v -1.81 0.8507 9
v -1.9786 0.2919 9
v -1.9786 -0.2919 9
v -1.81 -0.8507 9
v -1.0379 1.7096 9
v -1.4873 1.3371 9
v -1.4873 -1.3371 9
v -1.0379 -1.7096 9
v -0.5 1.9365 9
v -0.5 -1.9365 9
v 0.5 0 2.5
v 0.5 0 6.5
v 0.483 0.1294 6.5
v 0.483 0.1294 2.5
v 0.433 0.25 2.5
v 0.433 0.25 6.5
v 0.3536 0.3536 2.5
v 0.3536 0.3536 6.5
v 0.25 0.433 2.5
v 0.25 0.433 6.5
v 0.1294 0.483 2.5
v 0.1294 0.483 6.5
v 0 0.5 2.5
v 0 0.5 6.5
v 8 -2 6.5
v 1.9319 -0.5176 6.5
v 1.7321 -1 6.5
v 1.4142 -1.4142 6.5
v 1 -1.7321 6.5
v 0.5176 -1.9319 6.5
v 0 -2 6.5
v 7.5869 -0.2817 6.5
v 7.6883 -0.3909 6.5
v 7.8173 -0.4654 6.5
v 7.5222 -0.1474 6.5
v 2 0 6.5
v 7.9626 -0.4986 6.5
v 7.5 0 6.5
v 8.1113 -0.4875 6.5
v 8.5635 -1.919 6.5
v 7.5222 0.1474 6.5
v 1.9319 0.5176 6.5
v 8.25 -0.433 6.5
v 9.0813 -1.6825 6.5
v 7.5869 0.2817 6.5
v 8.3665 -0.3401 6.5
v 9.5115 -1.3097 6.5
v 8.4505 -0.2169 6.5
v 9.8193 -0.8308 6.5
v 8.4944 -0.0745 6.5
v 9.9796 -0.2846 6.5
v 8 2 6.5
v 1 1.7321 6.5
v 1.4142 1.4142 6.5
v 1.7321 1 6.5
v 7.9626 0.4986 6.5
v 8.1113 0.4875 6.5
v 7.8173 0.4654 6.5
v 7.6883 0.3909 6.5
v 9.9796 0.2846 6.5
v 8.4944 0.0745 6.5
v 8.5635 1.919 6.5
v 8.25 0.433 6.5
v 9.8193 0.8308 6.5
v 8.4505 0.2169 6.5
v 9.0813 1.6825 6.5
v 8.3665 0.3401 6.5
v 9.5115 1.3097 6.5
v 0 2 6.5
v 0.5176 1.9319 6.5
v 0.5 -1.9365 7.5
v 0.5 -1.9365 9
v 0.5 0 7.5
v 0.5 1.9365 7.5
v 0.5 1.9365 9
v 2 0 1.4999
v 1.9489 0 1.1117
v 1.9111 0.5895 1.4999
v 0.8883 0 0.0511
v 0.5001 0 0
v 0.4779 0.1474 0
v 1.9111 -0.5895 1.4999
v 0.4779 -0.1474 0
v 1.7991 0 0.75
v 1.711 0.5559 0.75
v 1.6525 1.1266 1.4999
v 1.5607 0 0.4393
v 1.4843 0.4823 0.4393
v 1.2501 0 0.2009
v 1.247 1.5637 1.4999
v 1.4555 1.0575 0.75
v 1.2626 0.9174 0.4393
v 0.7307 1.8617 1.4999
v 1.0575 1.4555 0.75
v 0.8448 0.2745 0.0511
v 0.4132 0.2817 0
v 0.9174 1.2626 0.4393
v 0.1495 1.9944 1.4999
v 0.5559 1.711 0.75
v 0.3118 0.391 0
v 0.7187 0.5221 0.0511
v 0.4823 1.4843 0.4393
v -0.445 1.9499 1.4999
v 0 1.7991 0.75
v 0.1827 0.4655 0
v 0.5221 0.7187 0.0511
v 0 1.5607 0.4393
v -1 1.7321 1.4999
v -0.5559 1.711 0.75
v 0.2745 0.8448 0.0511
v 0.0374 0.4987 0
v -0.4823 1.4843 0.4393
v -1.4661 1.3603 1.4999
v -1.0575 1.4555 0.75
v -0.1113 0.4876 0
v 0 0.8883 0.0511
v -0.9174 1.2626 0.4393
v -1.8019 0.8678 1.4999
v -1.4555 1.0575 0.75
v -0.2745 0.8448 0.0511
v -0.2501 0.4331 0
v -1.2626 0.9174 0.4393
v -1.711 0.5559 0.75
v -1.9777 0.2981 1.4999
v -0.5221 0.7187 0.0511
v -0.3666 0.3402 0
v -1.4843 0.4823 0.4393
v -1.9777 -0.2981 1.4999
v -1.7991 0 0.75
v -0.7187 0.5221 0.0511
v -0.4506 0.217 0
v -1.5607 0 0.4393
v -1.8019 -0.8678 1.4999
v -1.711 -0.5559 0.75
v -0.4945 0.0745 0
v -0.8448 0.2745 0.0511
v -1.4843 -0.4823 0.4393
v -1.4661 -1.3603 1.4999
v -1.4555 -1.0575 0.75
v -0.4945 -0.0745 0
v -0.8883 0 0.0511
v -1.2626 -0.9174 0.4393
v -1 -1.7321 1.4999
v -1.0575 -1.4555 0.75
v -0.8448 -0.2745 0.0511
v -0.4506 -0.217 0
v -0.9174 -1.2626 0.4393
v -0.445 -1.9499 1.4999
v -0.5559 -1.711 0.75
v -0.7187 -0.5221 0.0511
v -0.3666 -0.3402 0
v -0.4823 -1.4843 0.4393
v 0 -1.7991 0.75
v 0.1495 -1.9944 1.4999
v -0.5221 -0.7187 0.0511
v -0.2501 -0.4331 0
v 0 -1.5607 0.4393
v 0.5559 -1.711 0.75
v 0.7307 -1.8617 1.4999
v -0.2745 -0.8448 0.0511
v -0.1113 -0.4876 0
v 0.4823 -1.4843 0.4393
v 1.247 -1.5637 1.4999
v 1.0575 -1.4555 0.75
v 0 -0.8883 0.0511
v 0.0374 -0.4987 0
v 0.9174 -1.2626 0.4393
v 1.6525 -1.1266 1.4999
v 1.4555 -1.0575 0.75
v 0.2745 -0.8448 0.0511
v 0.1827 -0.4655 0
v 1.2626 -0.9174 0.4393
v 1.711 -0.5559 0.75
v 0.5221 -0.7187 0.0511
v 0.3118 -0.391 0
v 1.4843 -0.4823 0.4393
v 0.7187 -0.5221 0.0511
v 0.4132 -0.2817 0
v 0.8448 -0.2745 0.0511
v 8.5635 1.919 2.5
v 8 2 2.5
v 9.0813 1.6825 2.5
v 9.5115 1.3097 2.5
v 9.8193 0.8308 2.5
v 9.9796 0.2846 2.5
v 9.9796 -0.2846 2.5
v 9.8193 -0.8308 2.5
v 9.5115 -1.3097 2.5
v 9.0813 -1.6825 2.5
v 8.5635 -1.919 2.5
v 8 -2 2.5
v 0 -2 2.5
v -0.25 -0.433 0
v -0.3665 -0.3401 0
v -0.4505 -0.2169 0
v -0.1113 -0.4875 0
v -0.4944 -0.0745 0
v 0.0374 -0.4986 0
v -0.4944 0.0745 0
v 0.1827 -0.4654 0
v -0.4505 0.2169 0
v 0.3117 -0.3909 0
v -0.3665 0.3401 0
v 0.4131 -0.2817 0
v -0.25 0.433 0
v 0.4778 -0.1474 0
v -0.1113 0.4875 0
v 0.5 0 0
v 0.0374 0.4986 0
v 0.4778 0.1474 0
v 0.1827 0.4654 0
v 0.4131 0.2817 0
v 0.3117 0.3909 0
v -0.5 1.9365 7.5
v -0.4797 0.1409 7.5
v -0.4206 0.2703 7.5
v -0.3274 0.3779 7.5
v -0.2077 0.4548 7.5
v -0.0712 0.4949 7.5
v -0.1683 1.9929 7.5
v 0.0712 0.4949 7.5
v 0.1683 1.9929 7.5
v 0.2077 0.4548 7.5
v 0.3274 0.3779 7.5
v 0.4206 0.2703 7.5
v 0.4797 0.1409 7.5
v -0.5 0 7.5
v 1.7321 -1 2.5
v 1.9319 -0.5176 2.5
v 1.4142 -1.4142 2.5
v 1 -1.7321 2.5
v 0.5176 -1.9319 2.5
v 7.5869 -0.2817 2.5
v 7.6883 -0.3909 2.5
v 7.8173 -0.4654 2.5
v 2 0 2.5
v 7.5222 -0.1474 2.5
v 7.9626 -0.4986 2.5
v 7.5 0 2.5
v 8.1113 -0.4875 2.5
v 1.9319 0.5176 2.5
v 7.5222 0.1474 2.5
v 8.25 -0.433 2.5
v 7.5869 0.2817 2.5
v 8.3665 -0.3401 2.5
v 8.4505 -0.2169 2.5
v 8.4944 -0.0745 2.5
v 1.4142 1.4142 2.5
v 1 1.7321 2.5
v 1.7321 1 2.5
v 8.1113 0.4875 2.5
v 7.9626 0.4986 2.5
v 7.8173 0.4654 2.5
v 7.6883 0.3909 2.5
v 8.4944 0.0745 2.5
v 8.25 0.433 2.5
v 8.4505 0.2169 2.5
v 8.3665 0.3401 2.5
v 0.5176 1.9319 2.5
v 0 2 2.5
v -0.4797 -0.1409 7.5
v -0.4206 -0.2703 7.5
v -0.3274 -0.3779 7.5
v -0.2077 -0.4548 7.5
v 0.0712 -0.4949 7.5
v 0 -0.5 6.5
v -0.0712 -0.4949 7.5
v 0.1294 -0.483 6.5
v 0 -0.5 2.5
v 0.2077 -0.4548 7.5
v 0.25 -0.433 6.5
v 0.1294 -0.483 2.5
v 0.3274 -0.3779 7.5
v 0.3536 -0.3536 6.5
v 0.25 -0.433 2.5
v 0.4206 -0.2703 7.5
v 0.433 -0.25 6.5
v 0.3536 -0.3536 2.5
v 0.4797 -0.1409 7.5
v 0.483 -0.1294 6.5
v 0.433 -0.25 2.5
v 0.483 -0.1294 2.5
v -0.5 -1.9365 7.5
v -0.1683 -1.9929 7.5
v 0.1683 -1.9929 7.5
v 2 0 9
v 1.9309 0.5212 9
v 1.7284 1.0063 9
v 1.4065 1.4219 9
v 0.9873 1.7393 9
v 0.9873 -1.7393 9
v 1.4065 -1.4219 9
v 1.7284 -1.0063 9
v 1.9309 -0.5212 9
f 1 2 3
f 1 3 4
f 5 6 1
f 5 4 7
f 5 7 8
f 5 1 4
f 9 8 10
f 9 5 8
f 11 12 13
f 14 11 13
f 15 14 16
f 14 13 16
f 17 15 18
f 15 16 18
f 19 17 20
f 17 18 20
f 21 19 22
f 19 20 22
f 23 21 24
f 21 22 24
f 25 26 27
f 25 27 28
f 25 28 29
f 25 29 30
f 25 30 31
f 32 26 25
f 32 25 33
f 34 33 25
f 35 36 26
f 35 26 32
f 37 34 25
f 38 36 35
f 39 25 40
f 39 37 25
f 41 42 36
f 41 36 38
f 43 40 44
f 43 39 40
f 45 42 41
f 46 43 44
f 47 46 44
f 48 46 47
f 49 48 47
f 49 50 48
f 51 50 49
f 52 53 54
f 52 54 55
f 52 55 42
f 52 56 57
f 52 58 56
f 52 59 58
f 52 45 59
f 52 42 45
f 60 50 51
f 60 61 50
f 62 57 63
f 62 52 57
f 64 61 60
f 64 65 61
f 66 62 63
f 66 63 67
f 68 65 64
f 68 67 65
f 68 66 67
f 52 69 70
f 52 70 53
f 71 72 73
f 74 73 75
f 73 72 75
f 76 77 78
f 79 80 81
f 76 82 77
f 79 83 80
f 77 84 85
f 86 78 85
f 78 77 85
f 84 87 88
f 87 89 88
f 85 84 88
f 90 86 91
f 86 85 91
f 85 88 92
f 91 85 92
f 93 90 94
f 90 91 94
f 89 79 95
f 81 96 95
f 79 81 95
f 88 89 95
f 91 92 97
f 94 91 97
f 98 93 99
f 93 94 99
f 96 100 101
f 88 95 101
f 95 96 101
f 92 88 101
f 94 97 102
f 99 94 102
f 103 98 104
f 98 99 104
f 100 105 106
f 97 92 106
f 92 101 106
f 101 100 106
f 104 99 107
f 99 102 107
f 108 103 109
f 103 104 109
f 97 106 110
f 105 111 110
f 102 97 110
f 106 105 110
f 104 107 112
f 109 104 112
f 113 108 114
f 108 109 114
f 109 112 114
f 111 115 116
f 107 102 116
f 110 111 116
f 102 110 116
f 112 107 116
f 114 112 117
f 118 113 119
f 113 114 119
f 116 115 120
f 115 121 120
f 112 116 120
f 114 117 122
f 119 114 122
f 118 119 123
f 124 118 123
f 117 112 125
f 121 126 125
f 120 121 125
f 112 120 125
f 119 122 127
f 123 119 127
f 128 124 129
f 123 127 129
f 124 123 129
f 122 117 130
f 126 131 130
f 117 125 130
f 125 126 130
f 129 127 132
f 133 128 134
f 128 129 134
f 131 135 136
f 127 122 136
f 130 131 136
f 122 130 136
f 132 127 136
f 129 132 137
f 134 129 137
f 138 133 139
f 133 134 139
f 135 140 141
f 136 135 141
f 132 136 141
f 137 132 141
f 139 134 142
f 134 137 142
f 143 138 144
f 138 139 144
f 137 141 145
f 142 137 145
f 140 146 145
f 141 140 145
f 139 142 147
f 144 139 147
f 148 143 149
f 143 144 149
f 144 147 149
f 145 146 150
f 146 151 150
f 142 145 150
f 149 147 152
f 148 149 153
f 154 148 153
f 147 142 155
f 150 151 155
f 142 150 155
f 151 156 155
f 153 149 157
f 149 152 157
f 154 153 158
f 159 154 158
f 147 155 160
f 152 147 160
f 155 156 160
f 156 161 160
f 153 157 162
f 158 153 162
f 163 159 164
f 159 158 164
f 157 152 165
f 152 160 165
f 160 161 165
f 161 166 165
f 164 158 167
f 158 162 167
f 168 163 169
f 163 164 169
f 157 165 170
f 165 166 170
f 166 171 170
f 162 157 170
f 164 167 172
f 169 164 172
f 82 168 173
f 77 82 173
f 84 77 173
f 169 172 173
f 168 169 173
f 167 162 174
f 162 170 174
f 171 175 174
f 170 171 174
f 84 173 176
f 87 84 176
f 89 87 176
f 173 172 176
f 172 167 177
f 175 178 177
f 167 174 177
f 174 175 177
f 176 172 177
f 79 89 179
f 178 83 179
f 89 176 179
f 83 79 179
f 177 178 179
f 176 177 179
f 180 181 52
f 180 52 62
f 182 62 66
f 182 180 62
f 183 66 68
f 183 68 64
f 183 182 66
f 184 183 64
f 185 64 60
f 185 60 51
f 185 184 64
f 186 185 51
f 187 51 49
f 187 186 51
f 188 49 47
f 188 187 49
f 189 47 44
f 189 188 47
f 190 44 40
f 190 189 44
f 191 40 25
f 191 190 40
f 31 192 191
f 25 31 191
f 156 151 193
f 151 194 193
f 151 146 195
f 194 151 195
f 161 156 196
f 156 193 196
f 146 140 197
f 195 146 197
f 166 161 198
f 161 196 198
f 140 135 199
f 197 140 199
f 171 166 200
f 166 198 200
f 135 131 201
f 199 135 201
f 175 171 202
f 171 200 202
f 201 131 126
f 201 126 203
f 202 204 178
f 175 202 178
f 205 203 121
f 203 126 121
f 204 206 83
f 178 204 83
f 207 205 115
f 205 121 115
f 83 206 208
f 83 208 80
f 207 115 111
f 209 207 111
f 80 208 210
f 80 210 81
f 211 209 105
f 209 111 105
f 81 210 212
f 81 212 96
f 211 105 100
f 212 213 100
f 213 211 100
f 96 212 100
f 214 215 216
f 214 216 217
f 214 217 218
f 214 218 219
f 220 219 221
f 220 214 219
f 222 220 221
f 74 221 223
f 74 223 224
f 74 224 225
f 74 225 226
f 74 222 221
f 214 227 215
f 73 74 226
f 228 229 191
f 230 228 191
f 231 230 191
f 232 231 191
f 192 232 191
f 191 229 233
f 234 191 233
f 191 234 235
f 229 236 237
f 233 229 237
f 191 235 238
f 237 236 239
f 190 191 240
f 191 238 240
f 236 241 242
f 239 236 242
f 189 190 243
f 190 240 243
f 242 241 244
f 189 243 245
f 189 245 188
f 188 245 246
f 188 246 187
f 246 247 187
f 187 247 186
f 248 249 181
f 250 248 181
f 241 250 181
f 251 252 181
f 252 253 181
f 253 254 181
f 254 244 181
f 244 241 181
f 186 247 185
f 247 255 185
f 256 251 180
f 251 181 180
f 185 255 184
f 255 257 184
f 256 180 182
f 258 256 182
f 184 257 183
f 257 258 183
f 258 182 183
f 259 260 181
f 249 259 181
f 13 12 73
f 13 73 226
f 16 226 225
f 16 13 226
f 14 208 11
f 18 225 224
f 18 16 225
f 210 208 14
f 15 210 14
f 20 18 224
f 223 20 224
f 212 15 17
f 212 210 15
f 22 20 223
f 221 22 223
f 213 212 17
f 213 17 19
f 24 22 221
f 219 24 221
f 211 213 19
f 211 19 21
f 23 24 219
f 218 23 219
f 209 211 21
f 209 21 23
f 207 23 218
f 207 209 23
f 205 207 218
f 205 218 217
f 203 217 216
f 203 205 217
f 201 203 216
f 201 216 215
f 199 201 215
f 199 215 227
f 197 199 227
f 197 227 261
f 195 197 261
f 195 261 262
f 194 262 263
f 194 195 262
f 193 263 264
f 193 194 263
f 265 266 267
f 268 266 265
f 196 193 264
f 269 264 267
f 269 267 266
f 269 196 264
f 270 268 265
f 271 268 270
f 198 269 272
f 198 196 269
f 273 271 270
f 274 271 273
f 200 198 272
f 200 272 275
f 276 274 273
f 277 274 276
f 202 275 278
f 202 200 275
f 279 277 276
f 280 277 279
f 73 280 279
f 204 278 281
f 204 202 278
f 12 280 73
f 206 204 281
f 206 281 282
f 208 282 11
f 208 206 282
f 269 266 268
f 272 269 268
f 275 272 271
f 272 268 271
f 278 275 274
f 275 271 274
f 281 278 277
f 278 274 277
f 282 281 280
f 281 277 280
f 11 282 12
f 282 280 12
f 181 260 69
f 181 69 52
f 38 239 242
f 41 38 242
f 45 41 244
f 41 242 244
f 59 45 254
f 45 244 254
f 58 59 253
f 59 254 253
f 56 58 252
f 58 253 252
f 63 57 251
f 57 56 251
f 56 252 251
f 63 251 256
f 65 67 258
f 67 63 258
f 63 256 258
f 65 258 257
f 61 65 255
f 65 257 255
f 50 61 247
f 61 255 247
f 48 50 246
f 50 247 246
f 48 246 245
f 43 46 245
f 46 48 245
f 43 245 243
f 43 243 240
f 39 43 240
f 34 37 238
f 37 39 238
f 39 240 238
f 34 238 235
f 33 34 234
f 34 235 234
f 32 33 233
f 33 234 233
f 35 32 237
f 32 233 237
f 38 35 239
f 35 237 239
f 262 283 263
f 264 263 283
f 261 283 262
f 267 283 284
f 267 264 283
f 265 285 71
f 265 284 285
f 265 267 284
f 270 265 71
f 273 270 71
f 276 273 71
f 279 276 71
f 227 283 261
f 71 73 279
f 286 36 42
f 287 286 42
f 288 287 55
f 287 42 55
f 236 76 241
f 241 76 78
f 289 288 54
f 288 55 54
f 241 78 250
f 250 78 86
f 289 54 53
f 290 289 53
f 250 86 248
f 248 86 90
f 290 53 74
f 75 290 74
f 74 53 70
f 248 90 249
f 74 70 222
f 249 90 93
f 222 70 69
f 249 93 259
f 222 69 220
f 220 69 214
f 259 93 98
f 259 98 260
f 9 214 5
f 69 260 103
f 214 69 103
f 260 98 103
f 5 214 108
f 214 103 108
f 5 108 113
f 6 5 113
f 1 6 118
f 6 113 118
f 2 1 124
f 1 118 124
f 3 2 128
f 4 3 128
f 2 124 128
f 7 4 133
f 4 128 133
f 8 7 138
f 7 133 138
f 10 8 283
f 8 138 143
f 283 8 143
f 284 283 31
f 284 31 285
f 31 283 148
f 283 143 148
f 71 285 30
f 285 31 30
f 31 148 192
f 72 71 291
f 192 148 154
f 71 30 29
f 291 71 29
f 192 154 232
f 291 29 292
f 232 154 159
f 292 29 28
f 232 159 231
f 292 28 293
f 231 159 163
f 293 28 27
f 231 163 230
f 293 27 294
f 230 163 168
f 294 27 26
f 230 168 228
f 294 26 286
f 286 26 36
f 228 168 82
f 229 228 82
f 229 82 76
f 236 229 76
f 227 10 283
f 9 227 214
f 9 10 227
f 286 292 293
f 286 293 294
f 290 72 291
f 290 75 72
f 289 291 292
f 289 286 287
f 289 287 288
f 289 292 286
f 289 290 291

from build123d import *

# Parameters (mm, degrees)
SKETCH_1_R          = 2
SKETCH_1_R_2        = 0.5
EXTRUDE_1_DEPTH     = 9
SKETCH_2_W          = 1
SKETCH_2_H          = 4.164709902
CUT_EXTRUDE_1_DEPTH = 1.5
FILLET_2_R          = 1.5
SKETCH_3_W          = 8
SKETCH_3_H          = 4
EXTRUDE_2_DEPTH     = 2
SKETCH_4_R          = 2
SKETCH_4_R_2        = 0.5
EXTRUDE_3_DEPTH     = 4
SKETCH_5_R          = 0.5
CUT_EXTRUDE_2_DEPTH = 4
SKETCH_6_R          = 0.5
CUT_EXTRUDE_3_DEPTH = 14.601470509


with BuildPart() as part:
    # 草图1 → 凸台-拉伸1 (new body)
    with BuildSketch(Plane.XY):
        Circle(SKETCH_1_R)
        Circle(SKETCH_1_R_2, mode=Mode.SUBTRACT)
    extrude(amount=EXTRUDE_1_DEPTH)

    # 草图2 → 切除-拉伸1 (cut)
    with BuildSketch(Plane.XY.offset(9)):
        Rectangle(SKETCH_2_W, SKETCH_2_H)
    extrude(amount=-CUT_EXTRUDE_1_DEPTH, mode=Mode.SUBTRACT)

    # 圆角2
    fillet_2_edges = [part.edges().sort_by_distance(p)[0] for p in [
        (-2, 0, 0),
    ]]
    fillet(fillet_2_edges, radius=FILLET_2_R - 0.0001)  # a hair under: the kernel refuses the full size

    # 草图3 → 凸台-拉伸2 (add, symmetric)
    with BuildSketch(Plane(origin=(0, 0, 0), x_dir=(1, 0, 0), z_dir=(0, 1, 0))):
        with Locations((4, -4.5)):
            Rectangle(SKETCH_3_W, SKETCH_3_H)
    extrude(amount=EXTRUDE_2_DEPTH, both=True)

    # 草图4 → 凸台-拉伸3 (add)
    with BuildSketch(Plane(origin=(0, 0, 2.5), x_dir=(-1, 0, 0), z_dir=(0, 0, -1))):
        with Locations((-8, 0)):
            Circle(SKETCH_4_R)
        with Locations((-8, 0)):
            Circle(SKETCH_4_R_2, mode=Mode.SUBTRACT)
    extrude(amount=-EXTRUDE_3_DEPTH)

    # 草图5 → 切除-拉伸2 (cut)
    with BuildSketch(Plane(origin=(0, 0, 2.5), x_dir=(-1, 0, 0), z_dir=(0, 0, -1))):
        with Locations((-8, 0)):
            Circle(SKETCH_5_R)
    extrude(amount=-CUT_EXTRUDE_2_DEPTH, mode=Mode.SUBTRACT)

    # 草图6 → 切除-拉伸3 (cut, through all)
    with BuildSketch(Plane.XY.offset(9)):
        Circle(SKETCH_6_R)
    extrude(amount=-CUT_EXTRUDE_3_DEPTH, mode=Mode.SUBTRACT)


solid = part.part
